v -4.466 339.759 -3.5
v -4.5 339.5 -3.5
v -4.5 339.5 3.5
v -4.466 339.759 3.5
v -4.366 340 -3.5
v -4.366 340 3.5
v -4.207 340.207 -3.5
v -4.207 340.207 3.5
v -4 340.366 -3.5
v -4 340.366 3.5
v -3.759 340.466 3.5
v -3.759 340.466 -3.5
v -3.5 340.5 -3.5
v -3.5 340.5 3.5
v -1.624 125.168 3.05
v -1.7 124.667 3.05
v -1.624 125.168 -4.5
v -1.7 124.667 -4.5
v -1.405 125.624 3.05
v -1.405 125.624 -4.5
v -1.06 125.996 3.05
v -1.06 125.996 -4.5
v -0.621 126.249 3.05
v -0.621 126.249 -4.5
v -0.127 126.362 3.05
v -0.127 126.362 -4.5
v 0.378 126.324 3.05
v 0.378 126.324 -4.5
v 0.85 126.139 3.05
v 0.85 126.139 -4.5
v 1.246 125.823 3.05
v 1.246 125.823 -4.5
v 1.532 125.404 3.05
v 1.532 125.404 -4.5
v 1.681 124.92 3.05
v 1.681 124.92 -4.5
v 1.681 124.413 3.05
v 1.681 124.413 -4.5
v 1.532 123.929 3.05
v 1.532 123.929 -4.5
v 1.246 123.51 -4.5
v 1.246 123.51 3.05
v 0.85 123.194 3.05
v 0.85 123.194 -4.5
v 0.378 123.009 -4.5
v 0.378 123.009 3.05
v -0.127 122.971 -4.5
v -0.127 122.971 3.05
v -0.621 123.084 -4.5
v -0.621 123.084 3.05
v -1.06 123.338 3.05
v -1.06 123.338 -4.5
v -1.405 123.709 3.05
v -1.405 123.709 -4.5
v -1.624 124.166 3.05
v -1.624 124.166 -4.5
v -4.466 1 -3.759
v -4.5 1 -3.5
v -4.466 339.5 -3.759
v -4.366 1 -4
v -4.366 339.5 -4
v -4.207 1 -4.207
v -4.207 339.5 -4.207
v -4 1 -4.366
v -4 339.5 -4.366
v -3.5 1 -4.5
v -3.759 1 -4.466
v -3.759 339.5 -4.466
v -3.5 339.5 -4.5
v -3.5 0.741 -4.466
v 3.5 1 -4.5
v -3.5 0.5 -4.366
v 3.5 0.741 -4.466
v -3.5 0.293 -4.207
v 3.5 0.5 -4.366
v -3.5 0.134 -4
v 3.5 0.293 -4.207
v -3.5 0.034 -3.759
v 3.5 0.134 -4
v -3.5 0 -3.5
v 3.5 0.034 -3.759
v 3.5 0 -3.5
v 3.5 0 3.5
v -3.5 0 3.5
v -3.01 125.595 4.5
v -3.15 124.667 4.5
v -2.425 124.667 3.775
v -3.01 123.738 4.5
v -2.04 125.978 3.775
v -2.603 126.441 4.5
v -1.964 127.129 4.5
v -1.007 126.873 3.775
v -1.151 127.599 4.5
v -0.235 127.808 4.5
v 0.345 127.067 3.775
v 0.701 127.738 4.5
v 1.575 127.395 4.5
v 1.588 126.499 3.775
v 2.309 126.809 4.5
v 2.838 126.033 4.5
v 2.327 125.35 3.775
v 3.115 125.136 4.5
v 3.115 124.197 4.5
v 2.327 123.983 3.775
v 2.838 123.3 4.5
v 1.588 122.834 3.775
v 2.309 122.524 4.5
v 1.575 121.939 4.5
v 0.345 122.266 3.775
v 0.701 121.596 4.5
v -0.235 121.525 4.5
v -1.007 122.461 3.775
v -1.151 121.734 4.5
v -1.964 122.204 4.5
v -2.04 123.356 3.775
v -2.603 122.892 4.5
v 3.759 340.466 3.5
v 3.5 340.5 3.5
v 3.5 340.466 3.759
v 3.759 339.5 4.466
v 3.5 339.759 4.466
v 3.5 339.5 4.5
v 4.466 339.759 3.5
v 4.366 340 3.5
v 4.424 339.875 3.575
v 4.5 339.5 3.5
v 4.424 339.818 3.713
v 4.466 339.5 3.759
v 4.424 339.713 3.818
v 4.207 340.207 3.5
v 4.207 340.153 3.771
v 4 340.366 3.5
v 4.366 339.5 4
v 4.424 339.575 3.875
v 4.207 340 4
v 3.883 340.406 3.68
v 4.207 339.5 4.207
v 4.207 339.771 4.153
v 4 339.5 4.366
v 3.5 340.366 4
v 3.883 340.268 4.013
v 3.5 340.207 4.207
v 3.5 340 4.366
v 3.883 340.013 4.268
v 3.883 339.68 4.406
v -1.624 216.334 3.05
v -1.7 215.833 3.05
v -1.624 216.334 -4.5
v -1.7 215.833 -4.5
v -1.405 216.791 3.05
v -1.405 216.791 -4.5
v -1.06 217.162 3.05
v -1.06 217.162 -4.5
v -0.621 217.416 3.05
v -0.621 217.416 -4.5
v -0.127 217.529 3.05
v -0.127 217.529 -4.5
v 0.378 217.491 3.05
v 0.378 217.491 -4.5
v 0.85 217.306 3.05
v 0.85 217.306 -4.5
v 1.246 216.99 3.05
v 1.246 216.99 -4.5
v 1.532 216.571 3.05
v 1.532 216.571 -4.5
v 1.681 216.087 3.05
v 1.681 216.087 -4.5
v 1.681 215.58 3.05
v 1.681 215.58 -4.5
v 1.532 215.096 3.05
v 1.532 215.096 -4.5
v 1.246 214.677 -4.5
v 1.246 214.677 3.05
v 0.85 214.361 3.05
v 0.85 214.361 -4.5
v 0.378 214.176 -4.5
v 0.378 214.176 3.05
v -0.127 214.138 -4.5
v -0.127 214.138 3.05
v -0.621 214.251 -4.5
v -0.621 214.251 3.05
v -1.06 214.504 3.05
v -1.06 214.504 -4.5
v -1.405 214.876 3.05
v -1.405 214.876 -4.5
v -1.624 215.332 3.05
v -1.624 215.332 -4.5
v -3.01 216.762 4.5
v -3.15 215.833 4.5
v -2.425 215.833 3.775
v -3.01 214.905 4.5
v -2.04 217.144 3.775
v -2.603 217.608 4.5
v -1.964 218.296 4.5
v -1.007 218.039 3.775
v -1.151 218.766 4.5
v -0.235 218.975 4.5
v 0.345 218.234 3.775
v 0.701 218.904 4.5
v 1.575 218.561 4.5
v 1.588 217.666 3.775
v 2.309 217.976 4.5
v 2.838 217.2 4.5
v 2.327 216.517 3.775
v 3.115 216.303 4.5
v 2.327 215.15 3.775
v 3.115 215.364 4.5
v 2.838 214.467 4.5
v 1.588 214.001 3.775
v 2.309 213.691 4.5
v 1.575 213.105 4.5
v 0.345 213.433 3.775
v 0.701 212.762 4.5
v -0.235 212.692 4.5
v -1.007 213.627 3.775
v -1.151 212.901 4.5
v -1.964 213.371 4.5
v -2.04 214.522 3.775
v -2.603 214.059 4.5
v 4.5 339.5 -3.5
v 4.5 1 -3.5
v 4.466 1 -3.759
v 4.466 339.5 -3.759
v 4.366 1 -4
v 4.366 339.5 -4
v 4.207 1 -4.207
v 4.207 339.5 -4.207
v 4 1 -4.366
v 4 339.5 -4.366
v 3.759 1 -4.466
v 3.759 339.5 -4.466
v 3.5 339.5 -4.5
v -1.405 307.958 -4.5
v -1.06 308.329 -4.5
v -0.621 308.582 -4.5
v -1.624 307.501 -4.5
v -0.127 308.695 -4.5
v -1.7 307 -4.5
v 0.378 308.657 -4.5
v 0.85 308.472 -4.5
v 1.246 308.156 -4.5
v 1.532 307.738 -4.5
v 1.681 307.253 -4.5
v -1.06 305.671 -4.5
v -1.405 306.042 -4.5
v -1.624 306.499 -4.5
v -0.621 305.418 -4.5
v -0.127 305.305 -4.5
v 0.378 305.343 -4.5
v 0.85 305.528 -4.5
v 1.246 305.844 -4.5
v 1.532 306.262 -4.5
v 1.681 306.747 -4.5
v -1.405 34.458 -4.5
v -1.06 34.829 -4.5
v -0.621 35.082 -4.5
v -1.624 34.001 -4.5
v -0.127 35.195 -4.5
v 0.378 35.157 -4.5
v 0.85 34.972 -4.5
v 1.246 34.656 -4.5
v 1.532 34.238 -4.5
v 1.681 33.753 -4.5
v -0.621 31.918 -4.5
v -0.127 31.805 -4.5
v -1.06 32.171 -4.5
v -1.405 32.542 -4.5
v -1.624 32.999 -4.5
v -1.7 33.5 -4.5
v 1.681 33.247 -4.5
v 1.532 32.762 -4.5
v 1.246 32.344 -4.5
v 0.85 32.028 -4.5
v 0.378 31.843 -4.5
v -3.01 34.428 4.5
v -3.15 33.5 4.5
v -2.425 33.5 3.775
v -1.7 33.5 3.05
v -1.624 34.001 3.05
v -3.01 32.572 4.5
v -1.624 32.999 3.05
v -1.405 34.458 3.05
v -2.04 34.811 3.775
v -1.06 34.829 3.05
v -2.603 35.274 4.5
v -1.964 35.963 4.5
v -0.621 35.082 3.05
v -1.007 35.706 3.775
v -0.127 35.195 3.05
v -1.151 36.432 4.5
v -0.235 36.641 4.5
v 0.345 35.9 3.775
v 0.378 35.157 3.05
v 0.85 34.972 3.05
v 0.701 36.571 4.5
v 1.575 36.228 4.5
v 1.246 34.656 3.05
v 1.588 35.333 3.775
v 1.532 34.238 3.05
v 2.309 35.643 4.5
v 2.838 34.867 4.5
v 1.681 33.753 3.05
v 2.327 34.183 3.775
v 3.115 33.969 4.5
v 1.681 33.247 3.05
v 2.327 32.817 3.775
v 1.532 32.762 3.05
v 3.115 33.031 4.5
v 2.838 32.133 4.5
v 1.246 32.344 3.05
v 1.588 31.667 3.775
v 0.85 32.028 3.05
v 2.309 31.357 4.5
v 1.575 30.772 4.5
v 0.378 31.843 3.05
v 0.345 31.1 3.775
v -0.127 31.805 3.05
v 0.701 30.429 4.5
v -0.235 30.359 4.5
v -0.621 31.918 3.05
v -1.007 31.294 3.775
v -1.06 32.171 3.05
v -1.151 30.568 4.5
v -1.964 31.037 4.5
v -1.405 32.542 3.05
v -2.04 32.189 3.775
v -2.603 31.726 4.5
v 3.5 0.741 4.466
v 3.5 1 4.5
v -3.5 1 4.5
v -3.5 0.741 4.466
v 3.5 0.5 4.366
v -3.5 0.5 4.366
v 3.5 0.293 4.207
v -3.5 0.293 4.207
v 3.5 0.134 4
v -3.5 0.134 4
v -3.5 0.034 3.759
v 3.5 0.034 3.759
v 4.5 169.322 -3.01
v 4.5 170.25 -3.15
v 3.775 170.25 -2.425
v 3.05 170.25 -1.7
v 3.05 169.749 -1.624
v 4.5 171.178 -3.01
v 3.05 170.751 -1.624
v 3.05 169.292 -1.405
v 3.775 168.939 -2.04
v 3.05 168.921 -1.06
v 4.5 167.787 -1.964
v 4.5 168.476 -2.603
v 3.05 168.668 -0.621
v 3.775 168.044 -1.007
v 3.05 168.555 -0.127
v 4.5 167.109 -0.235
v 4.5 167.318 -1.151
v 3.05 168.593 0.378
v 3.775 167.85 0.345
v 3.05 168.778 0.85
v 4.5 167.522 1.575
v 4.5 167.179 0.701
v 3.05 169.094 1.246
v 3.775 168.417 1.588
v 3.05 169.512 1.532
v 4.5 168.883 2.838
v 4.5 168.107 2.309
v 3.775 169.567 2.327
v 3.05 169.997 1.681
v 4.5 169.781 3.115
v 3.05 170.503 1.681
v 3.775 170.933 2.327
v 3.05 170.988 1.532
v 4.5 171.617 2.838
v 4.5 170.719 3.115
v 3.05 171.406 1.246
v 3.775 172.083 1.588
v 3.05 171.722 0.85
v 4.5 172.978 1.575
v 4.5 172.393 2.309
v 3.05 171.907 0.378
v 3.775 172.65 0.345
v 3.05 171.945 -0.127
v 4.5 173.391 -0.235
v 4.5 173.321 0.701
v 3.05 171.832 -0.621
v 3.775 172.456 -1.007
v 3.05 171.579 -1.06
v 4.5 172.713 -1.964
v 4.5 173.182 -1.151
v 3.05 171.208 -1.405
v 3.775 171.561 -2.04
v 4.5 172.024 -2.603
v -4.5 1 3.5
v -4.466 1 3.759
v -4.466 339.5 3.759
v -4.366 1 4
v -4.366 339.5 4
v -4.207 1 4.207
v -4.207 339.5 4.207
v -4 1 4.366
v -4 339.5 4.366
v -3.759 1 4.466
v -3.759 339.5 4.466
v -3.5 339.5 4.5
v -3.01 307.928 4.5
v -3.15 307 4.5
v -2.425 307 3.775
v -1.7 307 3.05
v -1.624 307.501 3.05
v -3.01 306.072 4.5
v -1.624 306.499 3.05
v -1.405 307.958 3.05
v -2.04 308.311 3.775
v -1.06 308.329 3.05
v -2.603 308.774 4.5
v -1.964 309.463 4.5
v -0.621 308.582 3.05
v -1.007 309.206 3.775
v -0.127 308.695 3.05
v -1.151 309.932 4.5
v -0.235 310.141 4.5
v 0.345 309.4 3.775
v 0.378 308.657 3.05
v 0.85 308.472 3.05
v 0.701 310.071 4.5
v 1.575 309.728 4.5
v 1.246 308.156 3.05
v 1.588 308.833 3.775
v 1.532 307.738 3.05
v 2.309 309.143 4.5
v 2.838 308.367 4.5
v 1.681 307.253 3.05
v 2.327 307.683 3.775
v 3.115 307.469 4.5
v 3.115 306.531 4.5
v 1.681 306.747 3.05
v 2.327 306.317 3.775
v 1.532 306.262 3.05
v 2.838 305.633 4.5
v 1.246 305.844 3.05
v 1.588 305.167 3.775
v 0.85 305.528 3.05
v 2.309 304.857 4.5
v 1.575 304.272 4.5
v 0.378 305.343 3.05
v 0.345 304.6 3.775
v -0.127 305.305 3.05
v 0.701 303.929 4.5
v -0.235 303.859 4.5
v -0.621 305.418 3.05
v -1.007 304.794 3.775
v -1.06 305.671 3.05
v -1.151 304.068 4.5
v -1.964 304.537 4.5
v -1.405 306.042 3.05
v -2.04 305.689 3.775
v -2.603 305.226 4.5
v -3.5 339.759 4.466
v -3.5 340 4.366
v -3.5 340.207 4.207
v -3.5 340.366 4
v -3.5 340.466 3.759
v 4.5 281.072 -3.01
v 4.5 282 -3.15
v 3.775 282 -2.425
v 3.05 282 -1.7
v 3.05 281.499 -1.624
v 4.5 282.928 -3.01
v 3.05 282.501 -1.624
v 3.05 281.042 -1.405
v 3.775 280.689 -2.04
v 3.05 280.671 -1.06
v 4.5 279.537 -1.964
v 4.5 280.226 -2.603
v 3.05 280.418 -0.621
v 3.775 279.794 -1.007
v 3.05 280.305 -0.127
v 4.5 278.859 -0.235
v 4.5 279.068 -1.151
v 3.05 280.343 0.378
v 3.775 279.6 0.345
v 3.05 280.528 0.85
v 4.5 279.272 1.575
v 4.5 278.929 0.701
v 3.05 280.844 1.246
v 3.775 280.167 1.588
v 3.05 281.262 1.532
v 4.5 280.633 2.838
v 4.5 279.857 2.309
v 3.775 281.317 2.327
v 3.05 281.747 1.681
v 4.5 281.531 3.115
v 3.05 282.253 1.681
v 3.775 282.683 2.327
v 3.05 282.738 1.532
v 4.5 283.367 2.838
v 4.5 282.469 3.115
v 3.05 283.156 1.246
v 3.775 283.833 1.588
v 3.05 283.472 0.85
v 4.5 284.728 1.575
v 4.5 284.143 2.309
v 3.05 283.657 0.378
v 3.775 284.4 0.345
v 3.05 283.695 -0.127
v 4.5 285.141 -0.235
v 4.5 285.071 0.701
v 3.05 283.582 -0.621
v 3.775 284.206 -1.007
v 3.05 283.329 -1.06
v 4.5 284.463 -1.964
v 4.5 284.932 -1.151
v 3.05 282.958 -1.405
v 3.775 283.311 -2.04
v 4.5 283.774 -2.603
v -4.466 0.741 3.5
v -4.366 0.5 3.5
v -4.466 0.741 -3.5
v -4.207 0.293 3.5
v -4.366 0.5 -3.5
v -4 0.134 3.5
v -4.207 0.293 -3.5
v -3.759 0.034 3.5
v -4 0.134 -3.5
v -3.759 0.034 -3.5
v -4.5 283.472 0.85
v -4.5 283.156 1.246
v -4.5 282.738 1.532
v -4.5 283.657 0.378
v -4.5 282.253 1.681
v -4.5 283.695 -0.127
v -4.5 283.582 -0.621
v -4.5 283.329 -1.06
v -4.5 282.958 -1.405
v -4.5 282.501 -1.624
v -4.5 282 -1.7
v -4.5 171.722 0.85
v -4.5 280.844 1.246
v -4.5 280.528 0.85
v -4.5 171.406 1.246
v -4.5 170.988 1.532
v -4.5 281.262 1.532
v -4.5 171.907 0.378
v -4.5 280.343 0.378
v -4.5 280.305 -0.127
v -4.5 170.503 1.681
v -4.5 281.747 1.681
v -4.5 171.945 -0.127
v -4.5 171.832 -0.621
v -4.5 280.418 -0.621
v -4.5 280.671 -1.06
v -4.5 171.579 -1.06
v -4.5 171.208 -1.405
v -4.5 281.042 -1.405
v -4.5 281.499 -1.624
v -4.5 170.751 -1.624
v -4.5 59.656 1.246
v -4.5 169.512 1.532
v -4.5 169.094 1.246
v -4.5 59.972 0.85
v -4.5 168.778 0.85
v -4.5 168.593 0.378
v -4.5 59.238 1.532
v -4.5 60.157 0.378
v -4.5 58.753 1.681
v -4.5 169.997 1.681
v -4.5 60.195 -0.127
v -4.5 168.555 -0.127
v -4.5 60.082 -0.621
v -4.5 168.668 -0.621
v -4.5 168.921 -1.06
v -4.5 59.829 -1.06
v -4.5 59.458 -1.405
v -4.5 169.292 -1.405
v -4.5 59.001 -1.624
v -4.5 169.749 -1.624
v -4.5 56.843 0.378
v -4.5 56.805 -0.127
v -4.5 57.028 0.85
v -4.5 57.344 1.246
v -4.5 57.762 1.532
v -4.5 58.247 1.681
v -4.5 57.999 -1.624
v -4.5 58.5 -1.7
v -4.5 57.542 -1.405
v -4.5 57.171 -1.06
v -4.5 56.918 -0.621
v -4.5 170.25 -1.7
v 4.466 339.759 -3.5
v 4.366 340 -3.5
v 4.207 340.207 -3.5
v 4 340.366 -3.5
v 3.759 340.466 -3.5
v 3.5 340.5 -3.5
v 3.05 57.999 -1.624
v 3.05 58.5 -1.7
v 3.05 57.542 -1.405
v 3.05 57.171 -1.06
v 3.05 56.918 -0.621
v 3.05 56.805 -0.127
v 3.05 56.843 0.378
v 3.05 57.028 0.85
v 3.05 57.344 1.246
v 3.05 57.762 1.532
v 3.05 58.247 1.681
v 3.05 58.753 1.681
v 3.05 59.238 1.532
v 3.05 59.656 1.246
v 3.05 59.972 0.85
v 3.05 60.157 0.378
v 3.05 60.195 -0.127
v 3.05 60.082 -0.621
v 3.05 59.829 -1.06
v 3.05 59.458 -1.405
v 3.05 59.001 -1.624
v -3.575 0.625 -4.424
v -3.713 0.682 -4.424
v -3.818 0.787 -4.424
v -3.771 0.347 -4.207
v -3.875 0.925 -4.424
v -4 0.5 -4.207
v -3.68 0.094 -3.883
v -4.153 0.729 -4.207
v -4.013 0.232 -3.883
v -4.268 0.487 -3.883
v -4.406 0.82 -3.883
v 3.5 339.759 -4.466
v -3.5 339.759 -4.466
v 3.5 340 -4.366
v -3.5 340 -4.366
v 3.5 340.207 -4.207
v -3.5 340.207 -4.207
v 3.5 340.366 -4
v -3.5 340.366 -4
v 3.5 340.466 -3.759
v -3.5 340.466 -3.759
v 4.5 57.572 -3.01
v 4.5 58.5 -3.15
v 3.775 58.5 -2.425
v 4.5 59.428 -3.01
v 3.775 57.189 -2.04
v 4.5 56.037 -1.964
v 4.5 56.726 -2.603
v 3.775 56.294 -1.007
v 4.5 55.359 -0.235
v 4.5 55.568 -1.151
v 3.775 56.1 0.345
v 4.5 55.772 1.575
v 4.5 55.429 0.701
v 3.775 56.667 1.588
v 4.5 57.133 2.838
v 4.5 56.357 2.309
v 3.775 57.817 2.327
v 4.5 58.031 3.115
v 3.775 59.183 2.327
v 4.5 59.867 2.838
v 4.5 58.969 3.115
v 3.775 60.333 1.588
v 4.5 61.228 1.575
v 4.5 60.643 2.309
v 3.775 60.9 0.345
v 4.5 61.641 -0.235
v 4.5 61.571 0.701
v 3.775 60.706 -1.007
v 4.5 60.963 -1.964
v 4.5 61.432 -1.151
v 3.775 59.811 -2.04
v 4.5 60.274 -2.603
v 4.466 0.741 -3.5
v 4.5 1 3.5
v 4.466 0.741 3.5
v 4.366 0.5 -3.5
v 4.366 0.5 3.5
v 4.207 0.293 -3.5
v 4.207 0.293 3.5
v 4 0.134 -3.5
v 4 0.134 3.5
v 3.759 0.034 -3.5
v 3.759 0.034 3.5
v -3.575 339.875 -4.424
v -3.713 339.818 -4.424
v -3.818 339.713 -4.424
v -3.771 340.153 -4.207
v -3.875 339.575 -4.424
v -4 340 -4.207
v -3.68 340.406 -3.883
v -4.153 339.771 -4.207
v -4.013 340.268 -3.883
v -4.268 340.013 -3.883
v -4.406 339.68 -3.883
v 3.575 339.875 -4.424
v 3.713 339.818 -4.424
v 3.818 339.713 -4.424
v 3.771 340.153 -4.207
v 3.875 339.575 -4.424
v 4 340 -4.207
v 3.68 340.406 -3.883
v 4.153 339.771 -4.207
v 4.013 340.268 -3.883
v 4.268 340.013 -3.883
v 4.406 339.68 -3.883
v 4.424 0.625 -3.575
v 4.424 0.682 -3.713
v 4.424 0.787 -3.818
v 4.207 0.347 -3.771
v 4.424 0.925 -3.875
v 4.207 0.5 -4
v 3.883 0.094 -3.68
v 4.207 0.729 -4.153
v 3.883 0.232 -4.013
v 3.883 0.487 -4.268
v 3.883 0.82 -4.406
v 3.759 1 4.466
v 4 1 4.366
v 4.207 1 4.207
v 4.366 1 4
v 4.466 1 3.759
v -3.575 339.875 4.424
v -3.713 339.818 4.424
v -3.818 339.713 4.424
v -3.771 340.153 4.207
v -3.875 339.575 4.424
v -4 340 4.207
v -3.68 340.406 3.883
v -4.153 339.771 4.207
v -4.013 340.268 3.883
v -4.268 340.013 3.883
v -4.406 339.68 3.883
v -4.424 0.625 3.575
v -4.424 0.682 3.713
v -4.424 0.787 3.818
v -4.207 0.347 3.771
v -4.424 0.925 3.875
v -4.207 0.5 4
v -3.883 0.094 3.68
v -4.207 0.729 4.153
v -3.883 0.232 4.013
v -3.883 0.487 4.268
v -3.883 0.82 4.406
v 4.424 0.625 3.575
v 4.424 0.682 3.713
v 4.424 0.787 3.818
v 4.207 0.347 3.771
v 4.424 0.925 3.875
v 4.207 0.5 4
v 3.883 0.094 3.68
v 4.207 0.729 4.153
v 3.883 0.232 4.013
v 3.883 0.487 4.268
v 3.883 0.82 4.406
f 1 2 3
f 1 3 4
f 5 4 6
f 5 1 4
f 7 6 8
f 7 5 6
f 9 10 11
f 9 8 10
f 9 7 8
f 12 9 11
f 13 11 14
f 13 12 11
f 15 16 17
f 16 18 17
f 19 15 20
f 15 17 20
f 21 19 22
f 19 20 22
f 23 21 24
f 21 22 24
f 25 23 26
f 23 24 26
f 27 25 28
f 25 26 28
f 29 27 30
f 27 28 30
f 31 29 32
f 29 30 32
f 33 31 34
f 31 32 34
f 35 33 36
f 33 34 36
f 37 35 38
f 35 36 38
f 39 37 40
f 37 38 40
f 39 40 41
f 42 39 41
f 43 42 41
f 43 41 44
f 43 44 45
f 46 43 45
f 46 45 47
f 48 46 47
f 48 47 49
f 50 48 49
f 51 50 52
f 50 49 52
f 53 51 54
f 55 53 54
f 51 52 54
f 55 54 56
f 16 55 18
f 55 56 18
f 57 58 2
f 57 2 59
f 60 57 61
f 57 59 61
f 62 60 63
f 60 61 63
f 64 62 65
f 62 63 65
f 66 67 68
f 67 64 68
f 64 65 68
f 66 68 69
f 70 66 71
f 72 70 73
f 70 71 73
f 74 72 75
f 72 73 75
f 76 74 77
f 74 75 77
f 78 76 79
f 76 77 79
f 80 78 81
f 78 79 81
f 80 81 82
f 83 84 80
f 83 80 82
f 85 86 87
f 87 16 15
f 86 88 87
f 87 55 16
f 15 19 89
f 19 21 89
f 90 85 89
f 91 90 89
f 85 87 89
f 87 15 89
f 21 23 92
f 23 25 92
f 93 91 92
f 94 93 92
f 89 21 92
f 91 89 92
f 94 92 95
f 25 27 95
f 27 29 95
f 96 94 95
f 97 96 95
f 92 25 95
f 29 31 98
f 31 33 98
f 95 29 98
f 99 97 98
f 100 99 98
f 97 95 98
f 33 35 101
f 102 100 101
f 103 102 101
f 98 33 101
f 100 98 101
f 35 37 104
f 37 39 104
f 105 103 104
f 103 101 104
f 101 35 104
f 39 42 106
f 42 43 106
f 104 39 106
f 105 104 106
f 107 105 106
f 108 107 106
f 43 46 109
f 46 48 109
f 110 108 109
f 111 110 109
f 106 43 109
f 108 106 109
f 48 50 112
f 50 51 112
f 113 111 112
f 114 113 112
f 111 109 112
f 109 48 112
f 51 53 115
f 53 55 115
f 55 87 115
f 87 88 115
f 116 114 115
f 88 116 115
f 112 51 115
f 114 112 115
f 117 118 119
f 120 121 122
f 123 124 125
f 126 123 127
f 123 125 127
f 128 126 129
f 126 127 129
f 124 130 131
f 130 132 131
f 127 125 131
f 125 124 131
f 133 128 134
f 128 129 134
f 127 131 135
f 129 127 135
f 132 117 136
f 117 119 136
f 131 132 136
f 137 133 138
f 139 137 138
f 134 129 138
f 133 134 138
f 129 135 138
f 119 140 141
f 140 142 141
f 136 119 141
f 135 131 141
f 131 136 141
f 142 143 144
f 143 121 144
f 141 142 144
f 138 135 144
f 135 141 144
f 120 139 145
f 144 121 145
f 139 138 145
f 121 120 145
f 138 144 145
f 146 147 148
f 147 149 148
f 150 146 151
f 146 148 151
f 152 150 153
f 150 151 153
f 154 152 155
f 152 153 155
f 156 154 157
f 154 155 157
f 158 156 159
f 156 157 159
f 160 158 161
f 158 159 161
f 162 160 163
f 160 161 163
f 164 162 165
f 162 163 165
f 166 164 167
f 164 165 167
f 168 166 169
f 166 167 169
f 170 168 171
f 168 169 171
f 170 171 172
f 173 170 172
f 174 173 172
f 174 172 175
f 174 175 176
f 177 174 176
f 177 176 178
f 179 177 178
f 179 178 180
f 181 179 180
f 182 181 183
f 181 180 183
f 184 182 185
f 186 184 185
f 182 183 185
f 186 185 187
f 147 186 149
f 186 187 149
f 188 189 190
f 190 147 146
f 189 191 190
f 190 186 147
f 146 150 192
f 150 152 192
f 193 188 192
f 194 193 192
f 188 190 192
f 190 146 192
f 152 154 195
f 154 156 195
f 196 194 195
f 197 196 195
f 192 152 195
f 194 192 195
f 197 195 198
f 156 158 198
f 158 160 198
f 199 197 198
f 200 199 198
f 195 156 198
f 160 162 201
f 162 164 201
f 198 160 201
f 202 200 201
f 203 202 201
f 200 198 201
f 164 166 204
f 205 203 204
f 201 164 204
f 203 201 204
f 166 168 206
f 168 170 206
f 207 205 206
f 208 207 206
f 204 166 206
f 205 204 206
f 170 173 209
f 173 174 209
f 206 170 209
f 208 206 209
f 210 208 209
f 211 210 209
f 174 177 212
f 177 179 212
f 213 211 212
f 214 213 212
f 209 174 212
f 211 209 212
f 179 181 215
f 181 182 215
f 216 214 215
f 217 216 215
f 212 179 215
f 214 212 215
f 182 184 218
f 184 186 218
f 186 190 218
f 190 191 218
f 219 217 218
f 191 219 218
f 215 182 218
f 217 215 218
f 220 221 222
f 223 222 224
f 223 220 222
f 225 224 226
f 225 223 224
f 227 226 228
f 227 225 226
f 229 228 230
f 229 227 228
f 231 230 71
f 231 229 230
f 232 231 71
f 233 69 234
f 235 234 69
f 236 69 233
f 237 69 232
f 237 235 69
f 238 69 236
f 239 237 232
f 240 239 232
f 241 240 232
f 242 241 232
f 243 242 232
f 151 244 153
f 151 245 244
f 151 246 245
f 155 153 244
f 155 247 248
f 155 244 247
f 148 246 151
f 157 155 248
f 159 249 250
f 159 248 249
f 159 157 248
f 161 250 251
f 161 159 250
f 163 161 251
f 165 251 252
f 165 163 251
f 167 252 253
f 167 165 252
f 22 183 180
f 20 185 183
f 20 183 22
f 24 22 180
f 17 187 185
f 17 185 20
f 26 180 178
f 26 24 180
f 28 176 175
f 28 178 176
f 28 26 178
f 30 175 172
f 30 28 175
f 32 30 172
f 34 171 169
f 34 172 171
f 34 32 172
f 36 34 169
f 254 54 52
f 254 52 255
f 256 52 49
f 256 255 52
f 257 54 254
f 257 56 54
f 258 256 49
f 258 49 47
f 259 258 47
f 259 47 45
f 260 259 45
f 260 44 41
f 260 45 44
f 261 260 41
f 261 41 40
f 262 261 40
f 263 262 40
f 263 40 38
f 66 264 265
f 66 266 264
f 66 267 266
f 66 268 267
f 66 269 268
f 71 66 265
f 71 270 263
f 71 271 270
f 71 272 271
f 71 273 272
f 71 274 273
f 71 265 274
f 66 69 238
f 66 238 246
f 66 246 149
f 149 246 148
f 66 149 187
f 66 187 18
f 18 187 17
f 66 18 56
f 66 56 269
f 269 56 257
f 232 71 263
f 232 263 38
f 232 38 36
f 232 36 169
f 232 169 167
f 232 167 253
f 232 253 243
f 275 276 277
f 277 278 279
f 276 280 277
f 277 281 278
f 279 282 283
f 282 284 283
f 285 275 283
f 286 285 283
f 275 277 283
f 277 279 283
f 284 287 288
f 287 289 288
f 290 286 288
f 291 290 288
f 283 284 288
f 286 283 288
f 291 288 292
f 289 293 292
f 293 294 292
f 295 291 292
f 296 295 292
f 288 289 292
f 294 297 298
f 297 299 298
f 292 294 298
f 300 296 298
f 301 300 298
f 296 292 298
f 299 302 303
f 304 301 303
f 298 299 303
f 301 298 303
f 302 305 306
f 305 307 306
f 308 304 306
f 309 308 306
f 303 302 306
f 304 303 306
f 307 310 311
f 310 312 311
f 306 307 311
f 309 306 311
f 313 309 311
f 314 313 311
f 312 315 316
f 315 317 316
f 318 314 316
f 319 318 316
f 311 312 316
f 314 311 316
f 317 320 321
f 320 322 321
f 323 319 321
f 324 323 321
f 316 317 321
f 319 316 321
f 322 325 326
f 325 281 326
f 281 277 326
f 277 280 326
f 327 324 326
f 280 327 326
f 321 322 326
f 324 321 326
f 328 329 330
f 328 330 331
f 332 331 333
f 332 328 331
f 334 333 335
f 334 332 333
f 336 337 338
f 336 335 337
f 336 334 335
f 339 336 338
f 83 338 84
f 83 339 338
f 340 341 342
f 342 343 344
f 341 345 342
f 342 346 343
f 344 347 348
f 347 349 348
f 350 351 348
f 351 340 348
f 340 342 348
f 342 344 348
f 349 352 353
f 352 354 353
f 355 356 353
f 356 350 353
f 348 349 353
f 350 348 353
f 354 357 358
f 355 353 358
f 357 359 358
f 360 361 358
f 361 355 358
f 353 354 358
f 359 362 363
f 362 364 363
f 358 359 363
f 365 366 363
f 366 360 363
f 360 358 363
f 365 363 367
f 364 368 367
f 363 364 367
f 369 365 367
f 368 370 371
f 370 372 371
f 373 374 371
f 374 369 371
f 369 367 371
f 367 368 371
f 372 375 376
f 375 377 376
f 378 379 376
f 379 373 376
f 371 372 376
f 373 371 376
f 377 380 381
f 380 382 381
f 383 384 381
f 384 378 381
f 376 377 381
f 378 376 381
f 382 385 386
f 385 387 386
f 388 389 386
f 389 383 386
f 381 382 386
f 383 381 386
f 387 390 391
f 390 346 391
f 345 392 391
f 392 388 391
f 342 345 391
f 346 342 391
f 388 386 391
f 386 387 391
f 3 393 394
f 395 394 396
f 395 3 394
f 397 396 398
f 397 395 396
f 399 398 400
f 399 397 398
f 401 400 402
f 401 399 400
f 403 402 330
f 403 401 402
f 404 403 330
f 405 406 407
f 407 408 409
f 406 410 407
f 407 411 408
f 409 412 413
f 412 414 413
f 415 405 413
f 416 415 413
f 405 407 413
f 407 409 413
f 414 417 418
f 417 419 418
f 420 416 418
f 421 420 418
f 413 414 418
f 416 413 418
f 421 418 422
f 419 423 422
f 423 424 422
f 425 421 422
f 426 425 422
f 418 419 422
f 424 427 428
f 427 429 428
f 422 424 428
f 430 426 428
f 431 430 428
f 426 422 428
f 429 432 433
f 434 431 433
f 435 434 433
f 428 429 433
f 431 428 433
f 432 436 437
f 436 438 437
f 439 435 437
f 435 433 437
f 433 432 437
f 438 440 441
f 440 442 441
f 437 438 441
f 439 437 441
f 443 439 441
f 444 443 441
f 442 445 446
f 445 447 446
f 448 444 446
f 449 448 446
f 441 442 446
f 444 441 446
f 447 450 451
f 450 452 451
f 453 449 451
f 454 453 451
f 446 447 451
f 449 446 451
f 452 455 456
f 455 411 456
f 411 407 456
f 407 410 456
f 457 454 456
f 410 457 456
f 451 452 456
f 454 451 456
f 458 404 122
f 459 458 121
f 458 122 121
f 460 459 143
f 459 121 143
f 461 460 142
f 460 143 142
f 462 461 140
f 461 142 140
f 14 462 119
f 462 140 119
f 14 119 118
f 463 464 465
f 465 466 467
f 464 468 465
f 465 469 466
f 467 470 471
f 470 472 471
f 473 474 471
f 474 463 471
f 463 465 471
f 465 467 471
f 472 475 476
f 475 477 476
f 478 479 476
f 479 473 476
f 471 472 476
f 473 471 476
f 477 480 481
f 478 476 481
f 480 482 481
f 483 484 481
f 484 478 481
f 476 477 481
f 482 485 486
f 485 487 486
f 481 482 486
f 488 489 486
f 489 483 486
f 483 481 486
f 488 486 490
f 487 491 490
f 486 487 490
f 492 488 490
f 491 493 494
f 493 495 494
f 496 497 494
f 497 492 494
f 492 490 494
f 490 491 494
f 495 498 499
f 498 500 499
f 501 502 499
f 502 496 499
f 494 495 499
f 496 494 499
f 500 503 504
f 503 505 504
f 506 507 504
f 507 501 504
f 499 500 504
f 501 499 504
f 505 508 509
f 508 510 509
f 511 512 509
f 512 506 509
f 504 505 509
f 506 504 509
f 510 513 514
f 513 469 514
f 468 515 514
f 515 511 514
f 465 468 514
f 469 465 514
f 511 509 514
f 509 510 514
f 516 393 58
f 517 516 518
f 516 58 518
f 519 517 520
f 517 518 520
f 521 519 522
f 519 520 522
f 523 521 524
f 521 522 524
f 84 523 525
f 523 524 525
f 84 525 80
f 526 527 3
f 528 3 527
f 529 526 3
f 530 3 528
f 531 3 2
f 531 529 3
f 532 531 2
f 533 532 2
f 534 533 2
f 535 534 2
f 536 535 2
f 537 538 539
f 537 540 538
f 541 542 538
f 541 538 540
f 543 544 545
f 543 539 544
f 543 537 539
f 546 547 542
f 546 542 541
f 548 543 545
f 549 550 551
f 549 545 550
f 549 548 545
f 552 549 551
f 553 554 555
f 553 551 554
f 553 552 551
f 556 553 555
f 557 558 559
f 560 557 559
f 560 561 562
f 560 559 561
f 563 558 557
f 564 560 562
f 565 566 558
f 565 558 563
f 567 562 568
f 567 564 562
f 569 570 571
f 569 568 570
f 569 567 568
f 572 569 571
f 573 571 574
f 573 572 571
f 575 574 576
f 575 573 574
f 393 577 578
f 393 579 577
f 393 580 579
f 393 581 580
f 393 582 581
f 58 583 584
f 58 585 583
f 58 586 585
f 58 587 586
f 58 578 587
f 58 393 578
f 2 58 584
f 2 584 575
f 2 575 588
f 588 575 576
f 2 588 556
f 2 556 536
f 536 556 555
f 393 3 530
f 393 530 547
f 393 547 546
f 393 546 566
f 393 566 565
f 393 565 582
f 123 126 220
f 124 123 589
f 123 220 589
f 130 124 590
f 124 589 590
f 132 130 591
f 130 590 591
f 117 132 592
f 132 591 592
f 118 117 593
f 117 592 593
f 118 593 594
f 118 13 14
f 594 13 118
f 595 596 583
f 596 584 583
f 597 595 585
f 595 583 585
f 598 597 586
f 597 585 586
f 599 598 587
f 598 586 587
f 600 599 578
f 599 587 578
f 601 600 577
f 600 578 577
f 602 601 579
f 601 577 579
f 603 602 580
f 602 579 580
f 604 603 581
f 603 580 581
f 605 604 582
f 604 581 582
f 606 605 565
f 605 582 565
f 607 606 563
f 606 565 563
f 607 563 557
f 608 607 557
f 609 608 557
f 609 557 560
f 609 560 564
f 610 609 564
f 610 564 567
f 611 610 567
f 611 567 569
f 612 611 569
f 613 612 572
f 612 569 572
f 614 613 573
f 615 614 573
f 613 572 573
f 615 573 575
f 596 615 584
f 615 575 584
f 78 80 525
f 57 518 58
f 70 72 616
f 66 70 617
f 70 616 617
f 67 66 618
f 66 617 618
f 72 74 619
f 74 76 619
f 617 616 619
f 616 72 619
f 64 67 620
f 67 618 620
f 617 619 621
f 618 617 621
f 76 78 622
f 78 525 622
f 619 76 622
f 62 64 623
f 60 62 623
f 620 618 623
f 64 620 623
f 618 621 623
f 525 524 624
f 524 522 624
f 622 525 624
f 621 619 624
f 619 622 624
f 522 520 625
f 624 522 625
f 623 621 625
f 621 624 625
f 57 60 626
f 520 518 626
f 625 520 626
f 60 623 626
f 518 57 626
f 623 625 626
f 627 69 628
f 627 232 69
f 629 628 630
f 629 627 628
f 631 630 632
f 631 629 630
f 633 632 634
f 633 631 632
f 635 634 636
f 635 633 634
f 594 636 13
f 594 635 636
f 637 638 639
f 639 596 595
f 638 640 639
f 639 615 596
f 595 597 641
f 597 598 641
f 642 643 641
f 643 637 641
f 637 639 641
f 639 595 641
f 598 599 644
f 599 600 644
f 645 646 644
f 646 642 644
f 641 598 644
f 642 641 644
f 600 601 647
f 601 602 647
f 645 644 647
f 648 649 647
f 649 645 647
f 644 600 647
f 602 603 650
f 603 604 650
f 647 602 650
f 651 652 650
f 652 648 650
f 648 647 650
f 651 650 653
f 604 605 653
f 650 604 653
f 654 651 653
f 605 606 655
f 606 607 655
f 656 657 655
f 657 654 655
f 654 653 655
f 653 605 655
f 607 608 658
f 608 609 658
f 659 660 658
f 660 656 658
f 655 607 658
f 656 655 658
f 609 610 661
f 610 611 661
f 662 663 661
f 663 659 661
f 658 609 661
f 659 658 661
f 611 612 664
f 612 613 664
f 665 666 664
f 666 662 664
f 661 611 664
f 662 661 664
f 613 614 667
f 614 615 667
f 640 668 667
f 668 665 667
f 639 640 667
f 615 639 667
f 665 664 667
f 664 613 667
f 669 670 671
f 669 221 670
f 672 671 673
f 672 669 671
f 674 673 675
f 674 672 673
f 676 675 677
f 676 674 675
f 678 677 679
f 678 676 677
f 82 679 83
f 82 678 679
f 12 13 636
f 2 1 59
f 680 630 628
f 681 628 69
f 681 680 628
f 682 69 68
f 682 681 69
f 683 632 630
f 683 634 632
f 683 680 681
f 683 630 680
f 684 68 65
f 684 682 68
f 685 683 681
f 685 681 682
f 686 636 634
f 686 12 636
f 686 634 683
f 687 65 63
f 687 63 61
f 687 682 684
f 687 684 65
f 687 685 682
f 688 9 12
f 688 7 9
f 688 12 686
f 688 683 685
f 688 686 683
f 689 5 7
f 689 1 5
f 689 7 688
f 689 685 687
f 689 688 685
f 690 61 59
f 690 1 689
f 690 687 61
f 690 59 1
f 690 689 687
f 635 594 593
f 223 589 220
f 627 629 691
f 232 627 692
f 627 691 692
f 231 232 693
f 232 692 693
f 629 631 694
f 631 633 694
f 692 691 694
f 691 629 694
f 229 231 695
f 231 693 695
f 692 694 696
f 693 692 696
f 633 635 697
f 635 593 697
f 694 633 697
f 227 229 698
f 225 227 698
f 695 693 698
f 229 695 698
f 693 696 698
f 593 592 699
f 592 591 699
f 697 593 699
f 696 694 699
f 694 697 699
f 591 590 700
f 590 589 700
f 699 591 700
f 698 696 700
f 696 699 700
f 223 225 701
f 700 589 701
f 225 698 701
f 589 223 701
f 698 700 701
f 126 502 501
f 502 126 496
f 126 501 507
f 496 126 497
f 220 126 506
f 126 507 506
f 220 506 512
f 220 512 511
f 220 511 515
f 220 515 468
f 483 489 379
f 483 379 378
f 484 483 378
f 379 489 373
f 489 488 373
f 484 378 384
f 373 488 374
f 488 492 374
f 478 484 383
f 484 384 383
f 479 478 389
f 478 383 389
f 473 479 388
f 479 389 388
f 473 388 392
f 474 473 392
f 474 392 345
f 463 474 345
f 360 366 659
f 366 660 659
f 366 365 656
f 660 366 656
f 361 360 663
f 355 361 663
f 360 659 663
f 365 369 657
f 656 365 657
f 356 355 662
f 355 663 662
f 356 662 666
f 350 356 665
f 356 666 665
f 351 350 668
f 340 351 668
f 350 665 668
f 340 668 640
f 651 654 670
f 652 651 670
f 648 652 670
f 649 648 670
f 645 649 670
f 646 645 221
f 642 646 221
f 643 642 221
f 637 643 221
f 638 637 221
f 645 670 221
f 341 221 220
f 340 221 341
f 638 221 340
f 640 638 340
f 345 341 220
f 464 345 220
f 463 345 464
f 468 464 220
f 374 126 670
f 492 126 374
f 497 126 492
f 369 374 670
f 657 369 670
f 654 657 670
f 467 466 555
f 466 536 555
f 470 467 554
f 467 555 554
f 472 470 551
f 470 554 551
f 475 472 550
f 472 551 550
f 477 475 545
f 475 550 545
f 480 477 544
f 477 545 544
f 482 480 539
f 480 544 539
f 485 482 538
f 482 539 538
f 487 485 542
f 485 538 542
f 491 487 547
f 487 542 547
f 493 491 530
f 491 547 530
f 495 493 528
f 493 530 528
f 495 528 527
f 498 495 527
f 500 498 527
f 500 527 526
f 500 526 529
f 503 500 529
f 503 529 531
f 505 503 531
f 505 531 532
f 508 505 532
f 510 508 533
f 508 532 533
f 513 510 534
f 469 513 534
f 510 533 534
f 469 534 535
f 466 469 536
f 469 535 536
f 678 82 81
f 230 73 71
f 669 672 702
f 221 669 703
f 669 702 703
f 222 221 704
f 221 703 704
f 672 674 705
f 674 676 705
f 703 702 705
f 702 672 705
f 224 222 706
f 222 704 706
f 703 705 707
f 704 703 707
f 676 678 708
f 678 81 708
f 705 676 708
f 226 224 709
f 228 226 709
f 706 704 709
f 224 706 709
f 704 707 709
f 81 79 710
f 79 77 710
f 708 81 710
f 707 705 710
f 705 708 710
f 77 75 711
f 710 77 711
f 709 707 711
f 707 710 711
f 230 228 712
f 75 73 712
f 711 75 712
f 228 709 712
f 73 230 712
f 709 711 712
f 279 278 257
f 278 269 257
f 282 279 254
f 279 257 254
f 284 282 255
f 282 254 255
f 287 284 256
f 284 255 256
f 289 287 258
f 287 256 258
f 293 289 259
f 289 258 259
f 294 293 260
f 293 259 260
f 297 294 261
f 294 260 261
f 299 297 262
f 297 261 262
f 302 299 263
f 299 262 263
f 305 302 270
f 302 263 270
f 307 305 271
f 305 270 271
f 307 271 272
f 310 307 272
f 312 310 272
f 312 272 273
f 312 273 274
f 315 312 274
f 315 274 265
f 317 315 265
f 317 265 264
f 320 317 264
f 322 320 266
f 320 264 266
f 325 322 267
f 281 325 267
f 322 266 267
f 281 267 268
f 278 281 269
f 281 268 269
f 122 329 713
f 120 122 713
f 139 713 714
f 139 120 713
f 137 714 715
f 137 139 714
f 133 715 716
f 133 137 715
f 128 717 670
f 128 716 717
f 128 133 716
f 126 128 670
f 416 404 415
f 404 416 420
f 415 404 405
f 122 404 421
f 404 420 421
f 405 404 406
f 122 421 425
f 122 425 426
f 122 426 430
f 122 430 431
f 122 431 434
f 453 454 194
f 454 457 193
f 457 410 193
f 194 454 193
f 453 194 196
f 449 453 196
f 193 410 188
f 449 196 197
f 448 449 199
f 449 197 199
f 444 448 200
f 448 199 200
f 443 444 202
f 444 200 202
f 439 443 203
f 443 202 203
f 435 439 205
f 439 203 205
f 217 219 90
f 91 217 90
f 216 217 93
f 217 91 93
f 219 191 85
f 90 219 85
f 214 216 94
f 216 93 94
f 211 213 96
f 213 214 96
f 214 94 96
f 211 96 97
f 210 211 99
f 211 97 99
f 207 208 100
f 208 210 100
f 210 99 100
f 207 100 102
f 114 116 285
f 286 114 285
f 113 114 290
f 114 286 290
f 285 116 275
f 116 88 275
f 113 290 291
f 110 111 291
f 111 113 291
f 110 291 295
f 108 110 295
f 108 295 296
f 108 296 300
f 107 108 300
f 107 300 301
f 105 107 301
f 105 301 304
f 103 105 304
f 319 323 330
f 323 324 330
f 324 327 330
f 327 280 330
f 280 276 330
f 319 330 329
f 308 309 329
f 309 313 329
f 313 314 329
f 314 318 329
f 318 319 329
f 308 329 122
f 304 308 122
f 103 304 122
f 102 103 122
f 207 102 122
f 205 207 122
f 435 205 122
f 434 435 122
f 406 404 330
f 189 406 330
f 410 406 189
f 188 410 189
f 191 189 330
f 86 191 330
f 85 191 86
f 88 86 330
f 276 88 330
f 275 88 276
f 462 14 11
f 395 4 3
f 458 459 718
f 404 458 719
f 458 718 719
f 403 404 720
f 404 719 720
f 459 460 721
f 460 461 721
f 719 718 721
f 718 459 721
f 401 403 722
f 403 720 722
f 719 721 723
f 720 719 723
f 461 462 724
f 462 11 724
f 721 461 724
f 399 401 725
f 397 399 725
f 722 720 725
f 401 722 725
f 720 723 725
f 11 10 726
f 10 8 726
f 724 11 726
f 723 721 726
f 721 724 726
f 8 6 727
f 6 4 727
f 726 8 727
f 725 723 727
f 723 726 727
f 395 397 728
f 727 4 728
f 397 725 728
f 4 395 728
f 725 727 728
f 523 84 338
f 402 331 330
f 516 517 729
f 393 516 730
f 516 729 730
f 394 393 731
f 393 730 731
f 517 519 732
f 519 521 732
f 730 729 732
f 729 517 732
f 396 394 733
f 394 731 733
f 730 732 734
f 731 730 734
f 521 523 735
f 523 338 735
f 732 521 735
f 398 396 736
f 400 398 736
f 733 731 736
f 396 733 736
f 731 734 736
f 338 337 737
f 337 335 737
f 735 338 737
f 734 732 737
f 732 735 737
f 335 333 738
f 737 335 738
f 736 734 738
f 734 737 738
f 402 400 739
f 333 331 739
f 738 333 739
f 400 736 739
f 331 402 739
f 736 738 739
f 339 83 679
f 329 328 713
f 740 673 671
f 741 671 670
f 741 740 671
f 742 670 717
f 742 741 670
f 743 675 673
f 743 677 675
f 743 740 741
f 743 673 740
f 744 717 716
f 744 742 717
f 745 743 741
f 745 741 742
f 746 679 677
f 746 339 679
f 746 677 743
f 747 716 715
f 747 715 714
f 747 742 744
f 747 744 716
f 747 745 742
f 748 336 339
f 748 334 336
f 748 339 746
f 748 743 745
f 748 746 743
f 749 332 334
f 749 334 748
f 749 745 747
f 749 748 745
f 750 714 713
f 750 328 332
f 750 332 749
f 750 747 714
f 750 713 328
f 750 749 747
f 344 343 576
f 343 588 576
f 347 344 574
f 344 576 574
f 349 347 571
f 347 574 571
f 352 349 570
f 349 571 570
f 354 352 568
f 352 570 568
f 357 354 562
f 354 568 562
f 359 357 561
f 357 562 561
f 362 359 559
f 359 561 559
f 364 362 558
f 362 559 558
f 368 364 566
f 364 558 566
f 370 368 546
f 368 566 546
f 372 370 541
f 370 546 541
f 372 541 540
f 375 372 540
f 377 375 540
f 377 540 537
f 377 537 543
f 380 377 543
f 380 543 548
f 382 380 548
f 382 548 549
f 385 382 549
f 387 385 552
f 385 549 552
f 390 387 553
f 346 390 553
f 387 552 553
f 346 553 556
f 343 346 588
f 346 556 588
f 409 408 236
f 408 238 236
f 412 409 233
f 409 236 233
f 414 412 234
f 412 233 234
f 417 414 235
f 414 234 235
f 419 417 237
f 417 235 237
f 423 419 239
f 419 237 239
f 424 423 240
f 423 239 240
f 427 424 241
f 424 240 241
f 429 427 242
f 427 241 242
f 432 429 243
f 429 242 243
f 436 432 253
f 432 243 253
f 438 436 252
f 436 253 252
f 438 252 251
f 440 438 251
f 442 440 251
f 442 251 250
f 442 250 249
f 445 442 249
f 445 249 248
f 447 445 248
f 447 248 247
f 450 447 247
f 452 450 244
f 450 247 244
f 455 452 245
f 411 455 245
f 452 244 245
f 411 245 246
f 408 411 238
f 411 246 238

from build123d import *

# Parameters (mm, degrees)
SKETCH2_W                                            = 9
SKETCH2_H                                            = 9
RAIL_DEPTH                                           = 340.5
ROUNDED_EDGES_R                                      = 1
CSK_FOR_M3_FLAT_HEAD_MACHINE_SCREW1_D                = 3.4
CSK_FOR_M3_FLAT_HEAD_MACHINE_SCREW1_CSINK_D          = 6.3
CSK_FOR_M3_FLAT_HEAD_MACHINE_SCREW1_CSINK_ANGLE      = 90
CSK_FOR_M3_FLAT_HEAD_MACHINE_SCREW1_ON_F_D           = 3.4
CSK_FOR_M3_FLAT_HEAD_MACHINE_SCREW1_ON_F_CSINK_D     = 6.3
CSK_FOR_M3_FLAT_HEAD_MACHINE_SCREW1_ON_F_CSINK_ANGLE = 90


with BuildPart() as part:
    # Sketch2 → Rail (new body)
    with BuildSketch(Plane(origin=(0, 0, 0), x_dir=(1, 0, 0), z_dir=(0, 1, 0))):
        Rectangle(SKETCH2_W, SKETCH2_H)
    extrude(amount=RAIL_DEPTH)

    # Rounded Edges
    rounded_edges_edges = [part.edges().sort_by_distance(p)[0] for p in [
        (-4.5, 340.5, 0),
        (0, 340.5, 4.5),
        (4.5, 340.5, 0),
        (0, 0, 4.5),
        (-4.5, 0, 0),
        (0, 0, -4.5),
        (4.5, 0, 0),
        (0, 340.5, -4.5),
        (4.5, 170.25, 4.5),
        (-4.5, 170.25, 4.5),
        (-4.5, 170.25, -4.5),
        (4.5, 170.25, -4.5),
    ]]
    fillet(rounded_edges_edges, radius=ROUNDED_EDGES_R)

    # CSK for M3 Flat Head Machine Screw1 (through all)
    with Locations(Plane(origin=(4.5, 58.5, 0), x_dir=(0, 0, 1), z_dir=(1, 0, 0))):
        with Locations((0, 0), (0, -111.75), (0, -223.5)):
            CounterSinkHole(CSK_FOR_M3_FLAT_HEAD_MACHINE_SCREW1_D / 2, CSK_FOR_M3_FLAT_HEAD_MACHINE_SCREW1_CSINK_D / 2, counter_sink_angle=CSK_FOR_M3_FLAT_HEAD_MACHINE_SCREW1_CSINK_ANGLE)

    # CSK for M3 Flat Head Machine Screw1 on f (through all)
    with Locations(Plane(origin=(0, 307, 4.5), x_dir=(1, 0, 0), z_dir=(0, 0, 1))):
        with Locations((0, 0), (0, -91.166666667), (0, -182.333333333), (0, -273.5)):
            CounterSinkHole(CSK_FOR_M3_FLAT_HEAD_MACHINE_SCREW1_ON_F_D / 2, CSK_FOR_M3_FLAT_HEAD_MACHINE_SCREW1_ON_F_CSINK_D / 2, counter_sink_angle=CSK_FOR_M3_FLAT_HEAD_MACHINE_SCREW1_ON_F_CSINK_ANGLE)


solid = part.part
